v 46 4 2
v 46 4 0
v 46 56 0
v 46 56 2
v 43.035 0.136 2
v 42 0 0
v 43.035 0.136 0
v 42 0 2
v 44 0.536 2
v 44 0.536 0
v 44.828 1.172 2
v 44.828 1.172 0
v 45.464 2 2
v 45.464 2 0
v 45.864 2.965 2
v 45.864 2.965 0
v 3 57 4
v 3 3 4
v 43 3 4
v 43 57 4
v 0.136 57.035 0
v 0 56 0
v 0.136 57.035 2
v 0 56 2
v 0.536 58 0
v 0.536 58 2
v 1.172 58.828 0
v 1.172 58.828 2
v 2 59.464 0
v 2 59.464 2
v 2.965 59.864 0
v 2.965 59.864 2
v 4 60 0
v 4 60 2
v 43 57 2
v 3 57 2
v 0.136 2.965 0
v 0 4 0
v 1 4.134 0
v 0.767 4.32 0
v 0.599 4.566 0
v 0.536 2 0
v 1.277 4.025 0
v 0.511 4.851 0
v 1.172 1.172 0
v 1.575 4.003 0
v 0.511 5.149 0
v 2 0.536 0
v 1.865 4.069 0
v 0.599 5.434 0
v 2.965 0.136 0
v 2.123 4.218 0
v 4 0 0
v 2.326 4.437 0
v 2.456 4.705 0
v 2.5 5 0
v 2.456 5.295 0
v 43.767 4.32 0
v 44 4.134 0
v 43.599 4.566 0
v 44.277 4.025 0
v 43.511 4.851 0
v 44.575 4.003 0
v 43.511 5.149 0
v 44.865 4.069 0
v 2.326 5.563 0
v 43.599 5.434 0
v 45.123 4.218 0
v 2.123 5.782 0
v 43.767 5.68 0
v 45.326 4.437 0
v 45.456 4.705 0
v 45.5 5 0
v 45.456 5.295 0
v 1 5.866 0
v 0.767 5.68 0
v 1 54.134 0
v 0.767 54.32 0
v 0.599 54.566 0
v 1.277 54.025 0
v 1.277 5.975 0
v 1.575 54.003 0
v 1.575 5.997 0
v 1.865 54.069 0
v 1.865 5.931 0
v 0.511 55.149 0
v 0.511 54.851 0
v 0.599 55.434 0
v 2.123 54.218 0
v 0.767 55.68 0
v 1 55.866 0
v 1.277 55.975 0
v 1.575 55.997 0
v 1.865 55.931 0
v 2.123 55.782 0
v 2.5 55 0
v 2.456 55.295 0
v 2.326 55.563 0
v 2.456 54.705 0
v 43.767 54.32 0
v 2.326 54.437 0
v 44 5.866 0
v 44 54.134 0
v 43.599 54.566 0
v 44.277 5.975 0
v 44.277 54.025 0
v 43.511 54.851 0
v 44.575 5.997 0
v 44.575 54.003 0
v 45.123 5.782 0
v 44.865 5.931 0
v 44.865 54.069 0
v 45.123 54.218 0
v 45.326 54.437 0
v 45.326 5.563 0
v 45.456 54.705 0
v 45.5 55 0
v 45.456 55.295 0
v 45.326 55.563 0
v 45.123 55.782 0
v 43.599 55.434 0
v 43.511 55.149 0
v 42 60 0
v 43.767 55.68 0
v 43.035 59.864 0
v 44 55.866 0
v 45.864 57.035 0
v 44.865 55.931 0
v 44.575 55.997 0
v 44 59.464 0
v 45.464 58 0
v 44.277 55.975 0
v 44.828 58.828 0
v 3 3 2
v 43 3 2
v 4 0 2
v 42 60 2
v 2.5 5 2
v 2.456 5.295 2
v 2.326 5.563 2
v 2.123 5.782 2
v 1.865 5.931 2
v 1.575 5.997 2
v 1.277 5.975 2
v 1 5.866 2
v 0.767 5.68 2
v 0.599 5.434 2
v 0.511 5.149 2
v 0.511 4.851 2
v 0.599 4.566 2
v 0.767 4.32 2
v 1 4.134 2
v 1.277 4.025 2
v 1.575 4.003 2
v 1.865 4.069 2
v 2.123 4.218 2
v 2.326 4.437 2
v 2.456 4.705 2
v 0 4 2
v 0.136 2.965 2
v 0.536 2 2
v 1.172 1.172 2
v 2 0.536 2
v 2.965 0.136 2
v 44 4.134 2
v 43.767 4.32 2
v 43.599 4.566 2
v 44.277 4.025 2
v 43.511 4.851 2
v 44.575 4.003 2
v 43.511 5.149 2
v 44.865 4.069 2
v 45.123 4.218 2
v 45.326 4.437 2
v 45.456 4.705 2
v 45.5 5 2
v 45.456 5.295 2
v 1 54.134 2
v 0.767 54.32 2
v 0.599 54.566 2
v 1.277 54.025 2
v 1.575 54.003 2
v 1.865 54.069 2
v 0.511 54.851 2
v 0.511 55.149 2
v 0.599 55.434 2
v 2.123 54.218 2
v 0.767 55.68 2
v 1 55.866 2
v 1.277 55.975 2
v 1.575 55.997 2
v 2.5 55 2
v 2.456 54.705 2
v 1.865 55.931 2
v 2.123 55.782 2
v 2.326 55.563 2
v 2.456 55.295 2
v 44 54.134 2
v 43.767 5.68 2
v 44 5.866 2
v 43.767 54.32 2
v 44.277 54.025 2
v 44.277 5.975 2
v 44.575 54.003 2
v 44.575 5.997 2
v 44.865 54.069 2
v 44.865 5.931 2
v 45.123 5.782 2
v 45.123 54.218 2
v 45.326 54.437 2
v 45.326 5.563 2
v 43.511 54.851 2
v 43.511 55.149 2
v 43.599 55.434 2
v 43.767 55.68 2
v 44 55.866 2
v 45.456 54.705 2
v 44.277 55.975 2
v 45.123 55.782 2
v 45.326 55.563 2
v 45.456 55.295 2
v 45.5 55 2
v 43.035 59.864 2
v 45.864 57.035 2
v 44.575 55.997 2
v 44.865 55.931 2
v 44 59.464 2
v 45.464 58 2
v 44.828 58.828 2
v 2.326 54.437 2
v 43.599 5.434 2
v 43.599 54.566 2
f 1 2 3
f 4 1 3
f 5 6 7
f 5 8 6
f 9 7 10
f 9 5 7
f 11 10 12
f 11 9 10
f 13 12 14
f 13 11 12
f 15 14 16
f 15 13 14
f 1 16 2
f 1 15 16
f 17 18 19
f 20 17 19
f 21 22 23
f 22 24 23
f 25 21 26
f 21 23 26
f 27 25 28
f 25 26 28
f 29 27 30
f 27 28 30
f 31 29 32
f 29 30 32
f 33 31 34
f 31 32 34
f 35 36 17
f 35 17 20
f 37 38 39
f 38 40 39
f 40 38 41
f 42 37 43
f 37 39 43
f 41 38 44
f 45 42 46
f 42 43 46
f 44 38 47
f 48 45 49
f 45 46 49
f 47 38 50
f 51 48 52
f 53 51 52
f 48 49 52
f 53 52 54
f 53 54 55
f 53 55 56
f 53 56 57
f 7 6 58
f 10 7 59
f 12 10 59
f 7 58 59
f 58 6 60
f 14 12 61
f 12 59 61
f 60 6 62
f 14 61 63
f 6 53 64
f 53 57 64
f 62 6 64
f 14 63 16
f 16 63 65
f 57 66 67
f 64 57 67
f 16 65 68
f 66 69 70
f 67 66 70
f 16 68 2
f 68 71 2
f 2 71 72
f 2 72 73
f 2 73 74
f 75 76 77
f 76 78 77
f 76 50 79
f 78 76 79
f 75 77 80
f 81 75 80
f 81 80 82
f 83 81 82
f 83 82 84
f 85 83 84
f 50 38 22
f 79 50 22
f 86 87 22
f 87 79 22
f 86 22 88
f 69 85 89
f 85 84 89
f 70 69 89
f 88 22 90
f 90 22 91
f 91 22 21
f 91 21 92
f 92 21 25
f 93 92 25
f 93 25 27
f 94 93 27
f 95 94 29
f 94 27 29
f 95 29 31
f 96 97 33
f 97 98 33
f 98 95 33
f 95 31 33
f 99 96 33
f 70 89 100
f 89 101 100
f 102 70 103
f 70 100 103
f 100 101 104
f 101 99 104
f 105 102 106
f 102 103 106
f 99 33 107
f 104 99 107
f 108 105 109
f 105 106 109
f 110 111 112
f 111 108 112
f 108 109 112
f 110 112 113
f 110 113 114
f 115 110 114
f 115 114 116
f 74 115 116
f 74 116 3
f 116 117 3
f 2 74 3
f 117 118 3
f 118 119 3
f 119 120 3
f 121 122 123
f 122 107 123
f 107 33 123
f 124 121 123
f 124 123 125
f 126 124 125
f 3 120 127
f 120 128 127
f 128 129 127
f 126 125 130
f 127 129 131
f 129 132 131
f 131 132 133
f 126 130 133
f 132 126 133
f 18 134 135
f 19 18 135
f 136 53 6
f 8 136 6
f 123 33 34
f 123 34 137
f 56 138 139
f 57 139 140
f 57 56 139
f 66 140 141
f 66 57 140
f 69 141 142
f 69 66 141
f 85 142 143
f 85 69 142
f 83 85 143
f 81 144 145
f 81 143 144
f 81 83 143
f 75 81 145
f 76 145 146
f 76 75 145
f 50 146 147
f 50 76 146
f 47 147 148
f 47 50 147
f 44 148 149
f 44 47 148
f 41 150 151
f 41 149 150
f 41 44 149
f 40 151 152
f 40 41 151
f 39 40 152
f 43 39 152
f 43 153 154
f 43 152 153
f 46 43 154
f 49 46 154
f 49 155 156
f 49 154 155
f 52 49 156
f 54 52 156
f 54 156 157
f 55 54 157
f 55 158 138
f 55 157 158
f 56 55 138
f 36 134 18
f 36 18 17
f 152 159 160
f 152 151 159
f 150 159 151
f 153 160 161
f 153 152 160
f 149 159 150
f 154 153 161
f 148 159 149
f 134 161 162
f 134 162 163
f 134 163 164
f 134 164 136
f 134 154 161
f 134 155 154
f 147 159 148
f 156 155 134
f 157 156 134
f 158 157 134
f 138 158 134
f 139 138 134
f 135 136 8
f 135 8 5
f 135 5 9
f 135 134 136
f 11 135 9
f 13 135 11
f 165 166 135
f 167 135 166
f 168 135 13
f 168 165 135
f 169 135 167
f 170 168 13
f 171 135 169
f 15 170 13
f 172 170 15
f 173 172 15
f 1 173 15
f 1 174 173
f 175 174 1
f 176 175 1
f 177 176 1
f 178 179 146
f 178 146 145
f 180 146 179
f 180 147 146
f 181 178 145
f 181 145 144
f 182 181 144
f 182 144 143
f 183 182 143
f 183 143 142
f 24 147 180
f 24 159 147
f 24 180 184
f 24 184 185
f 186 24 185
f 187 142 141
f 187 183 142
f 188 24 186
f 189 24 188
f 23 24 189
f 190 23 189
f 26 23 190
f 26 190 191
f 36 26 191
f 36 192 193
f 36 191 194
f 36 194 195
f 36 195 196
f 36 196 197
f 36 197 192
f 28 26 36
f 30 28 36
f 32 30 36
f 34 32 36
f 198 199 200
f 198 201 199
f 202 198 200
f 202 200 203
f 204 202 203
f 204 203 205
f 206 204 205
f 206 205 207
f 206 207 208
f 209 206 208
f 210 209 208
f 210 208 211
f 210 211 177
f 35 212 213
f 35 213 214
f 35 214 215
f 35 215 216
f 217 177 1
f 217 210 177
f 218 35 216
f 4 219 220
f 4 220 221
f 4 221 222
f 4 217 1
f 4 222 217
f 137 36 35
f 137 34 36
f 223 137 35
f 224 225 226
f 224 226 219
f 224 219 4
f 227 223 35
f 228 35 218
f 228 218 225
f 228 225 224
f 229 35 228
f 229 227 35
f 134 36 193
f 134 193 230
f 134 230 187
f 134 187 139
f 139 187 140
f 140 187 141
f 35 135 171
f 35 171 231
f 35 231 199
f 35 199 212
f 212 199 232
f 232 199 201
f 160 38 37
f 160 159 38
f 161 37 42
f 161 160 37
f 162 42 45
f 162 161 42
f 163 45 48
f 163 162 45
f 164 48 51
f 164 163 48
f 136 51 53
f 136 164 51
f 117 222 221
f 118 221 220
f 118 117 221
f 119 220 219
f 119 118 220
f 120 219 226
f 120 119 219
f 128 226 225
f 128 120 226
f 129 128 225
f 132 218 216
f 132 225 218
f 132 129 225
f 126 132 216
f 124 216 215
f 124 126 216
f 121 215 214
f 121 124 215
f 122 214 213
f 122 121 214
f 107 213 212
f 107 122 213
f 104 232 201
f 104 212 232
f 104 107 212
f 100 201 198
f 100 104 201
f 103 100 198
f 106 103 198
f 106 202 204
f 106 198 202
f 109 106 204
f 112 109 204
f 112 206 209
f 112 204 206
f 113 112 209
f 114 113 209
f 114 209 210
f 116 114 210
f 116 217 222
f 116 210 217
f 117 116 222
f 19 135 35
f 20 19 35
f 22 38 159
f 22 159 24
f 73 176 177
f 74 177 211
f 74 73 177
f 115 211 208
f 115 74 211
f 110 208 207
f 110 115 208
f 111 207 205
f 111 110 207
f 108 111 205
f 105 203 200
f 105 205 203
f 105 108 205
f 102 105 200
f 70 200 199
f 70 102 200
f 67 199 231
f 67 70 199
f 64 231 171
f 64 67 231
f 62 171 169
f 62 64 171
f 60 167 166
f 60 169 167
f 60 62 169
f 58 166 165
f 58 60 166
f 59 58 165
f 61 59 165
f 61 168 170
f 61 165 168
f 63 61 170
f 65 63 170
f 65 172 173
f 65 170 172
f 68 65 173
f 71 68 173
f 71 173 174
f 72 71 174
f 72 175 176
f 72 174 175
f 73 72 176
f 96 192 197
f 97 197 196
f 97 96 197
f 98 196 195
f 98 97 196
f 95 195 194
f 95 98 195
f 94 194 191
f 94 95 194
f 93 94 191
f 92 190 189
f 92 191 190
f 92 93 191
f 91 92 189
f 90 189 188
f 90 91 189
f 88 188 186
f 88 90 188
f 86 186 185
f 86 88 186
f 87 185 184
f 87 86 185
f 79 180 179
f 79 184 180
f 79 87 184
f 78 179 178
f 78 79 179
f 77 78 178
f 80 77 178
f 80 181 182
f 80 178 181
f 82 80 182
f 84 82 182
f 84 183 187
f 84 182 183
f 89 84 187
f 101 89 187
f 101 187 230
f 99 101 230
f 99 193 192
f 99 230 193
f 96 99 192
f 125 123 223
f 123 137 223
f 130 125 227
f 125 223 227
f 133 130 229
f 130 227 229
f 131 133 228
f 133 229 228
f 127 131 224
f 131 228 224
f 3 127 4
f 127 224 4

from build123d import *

# Parameters (mm, degrees)
ESQUISSE1_W             = 40
ESQUISSE1_H             = 54
BOSS_EXTRU_1_DEPTH      = 4
ESQUISSE2_W             = 46
ESQUISSE2_H             = 60
BOSS_EXTRU_2_DEPTH      = 2
CONG_1_R                = 4
ESQUISSE3_R             = 1
ENL_V_MAT_EXTRU_1_DEPTH = 76.709972923


with BuildPart() as part:
    # Esquisse1 → Boss.-Extru.1 (new body)
    with BuildSketch(Plane.XY):
        with Locations((23, 30)):
            Rectangle(ESQUISSE1_W, ESQUISSE1_H)
    extrude(amount=BOSS_EXTRU_1_DEPTH)

    # Esquisse2 → Boss.-Extru.2 (add)
    with BuildSketch(Plane.XY):
        with Locations((23, 30)):
            Rectangle(ESQUISSE2_W, ESQUISSE2_H)
    extrude(amount=BOSS_EXTRU_2_DEPTH)

    # Congé1
    cong_1_edges = [part.edges().sort_by_distance(p)[0] for p in [
        (0, 60, 1),
        (0, 0, 1),
        (46, 0, 1),
        (46, 60, 1),
    ]]
    fillet(cong_1_edges, radius=CONG_1_R)

    # Esquisse3 → Enlèv. mat.-Extru.1 (cut, through all)
    with BuildSketch(Plane.XY):
        with Locations((44.5, 5)):
            Circle(ESQUISSE3_R)
        with Locations((1.5, 5)):
            Circle(ESQUISSE3_R)
        with Locations((1.5, 55)):
            Circle(ESQUISSE3_R)
        with Locations((44.5, 55)):
            Circle(ESQUISSE3_R)
    extrude(amount=ENL_V_MAT_EXTRU_1_DEPTH, mode=Mode.SUBTRACT)


solid = part.part
